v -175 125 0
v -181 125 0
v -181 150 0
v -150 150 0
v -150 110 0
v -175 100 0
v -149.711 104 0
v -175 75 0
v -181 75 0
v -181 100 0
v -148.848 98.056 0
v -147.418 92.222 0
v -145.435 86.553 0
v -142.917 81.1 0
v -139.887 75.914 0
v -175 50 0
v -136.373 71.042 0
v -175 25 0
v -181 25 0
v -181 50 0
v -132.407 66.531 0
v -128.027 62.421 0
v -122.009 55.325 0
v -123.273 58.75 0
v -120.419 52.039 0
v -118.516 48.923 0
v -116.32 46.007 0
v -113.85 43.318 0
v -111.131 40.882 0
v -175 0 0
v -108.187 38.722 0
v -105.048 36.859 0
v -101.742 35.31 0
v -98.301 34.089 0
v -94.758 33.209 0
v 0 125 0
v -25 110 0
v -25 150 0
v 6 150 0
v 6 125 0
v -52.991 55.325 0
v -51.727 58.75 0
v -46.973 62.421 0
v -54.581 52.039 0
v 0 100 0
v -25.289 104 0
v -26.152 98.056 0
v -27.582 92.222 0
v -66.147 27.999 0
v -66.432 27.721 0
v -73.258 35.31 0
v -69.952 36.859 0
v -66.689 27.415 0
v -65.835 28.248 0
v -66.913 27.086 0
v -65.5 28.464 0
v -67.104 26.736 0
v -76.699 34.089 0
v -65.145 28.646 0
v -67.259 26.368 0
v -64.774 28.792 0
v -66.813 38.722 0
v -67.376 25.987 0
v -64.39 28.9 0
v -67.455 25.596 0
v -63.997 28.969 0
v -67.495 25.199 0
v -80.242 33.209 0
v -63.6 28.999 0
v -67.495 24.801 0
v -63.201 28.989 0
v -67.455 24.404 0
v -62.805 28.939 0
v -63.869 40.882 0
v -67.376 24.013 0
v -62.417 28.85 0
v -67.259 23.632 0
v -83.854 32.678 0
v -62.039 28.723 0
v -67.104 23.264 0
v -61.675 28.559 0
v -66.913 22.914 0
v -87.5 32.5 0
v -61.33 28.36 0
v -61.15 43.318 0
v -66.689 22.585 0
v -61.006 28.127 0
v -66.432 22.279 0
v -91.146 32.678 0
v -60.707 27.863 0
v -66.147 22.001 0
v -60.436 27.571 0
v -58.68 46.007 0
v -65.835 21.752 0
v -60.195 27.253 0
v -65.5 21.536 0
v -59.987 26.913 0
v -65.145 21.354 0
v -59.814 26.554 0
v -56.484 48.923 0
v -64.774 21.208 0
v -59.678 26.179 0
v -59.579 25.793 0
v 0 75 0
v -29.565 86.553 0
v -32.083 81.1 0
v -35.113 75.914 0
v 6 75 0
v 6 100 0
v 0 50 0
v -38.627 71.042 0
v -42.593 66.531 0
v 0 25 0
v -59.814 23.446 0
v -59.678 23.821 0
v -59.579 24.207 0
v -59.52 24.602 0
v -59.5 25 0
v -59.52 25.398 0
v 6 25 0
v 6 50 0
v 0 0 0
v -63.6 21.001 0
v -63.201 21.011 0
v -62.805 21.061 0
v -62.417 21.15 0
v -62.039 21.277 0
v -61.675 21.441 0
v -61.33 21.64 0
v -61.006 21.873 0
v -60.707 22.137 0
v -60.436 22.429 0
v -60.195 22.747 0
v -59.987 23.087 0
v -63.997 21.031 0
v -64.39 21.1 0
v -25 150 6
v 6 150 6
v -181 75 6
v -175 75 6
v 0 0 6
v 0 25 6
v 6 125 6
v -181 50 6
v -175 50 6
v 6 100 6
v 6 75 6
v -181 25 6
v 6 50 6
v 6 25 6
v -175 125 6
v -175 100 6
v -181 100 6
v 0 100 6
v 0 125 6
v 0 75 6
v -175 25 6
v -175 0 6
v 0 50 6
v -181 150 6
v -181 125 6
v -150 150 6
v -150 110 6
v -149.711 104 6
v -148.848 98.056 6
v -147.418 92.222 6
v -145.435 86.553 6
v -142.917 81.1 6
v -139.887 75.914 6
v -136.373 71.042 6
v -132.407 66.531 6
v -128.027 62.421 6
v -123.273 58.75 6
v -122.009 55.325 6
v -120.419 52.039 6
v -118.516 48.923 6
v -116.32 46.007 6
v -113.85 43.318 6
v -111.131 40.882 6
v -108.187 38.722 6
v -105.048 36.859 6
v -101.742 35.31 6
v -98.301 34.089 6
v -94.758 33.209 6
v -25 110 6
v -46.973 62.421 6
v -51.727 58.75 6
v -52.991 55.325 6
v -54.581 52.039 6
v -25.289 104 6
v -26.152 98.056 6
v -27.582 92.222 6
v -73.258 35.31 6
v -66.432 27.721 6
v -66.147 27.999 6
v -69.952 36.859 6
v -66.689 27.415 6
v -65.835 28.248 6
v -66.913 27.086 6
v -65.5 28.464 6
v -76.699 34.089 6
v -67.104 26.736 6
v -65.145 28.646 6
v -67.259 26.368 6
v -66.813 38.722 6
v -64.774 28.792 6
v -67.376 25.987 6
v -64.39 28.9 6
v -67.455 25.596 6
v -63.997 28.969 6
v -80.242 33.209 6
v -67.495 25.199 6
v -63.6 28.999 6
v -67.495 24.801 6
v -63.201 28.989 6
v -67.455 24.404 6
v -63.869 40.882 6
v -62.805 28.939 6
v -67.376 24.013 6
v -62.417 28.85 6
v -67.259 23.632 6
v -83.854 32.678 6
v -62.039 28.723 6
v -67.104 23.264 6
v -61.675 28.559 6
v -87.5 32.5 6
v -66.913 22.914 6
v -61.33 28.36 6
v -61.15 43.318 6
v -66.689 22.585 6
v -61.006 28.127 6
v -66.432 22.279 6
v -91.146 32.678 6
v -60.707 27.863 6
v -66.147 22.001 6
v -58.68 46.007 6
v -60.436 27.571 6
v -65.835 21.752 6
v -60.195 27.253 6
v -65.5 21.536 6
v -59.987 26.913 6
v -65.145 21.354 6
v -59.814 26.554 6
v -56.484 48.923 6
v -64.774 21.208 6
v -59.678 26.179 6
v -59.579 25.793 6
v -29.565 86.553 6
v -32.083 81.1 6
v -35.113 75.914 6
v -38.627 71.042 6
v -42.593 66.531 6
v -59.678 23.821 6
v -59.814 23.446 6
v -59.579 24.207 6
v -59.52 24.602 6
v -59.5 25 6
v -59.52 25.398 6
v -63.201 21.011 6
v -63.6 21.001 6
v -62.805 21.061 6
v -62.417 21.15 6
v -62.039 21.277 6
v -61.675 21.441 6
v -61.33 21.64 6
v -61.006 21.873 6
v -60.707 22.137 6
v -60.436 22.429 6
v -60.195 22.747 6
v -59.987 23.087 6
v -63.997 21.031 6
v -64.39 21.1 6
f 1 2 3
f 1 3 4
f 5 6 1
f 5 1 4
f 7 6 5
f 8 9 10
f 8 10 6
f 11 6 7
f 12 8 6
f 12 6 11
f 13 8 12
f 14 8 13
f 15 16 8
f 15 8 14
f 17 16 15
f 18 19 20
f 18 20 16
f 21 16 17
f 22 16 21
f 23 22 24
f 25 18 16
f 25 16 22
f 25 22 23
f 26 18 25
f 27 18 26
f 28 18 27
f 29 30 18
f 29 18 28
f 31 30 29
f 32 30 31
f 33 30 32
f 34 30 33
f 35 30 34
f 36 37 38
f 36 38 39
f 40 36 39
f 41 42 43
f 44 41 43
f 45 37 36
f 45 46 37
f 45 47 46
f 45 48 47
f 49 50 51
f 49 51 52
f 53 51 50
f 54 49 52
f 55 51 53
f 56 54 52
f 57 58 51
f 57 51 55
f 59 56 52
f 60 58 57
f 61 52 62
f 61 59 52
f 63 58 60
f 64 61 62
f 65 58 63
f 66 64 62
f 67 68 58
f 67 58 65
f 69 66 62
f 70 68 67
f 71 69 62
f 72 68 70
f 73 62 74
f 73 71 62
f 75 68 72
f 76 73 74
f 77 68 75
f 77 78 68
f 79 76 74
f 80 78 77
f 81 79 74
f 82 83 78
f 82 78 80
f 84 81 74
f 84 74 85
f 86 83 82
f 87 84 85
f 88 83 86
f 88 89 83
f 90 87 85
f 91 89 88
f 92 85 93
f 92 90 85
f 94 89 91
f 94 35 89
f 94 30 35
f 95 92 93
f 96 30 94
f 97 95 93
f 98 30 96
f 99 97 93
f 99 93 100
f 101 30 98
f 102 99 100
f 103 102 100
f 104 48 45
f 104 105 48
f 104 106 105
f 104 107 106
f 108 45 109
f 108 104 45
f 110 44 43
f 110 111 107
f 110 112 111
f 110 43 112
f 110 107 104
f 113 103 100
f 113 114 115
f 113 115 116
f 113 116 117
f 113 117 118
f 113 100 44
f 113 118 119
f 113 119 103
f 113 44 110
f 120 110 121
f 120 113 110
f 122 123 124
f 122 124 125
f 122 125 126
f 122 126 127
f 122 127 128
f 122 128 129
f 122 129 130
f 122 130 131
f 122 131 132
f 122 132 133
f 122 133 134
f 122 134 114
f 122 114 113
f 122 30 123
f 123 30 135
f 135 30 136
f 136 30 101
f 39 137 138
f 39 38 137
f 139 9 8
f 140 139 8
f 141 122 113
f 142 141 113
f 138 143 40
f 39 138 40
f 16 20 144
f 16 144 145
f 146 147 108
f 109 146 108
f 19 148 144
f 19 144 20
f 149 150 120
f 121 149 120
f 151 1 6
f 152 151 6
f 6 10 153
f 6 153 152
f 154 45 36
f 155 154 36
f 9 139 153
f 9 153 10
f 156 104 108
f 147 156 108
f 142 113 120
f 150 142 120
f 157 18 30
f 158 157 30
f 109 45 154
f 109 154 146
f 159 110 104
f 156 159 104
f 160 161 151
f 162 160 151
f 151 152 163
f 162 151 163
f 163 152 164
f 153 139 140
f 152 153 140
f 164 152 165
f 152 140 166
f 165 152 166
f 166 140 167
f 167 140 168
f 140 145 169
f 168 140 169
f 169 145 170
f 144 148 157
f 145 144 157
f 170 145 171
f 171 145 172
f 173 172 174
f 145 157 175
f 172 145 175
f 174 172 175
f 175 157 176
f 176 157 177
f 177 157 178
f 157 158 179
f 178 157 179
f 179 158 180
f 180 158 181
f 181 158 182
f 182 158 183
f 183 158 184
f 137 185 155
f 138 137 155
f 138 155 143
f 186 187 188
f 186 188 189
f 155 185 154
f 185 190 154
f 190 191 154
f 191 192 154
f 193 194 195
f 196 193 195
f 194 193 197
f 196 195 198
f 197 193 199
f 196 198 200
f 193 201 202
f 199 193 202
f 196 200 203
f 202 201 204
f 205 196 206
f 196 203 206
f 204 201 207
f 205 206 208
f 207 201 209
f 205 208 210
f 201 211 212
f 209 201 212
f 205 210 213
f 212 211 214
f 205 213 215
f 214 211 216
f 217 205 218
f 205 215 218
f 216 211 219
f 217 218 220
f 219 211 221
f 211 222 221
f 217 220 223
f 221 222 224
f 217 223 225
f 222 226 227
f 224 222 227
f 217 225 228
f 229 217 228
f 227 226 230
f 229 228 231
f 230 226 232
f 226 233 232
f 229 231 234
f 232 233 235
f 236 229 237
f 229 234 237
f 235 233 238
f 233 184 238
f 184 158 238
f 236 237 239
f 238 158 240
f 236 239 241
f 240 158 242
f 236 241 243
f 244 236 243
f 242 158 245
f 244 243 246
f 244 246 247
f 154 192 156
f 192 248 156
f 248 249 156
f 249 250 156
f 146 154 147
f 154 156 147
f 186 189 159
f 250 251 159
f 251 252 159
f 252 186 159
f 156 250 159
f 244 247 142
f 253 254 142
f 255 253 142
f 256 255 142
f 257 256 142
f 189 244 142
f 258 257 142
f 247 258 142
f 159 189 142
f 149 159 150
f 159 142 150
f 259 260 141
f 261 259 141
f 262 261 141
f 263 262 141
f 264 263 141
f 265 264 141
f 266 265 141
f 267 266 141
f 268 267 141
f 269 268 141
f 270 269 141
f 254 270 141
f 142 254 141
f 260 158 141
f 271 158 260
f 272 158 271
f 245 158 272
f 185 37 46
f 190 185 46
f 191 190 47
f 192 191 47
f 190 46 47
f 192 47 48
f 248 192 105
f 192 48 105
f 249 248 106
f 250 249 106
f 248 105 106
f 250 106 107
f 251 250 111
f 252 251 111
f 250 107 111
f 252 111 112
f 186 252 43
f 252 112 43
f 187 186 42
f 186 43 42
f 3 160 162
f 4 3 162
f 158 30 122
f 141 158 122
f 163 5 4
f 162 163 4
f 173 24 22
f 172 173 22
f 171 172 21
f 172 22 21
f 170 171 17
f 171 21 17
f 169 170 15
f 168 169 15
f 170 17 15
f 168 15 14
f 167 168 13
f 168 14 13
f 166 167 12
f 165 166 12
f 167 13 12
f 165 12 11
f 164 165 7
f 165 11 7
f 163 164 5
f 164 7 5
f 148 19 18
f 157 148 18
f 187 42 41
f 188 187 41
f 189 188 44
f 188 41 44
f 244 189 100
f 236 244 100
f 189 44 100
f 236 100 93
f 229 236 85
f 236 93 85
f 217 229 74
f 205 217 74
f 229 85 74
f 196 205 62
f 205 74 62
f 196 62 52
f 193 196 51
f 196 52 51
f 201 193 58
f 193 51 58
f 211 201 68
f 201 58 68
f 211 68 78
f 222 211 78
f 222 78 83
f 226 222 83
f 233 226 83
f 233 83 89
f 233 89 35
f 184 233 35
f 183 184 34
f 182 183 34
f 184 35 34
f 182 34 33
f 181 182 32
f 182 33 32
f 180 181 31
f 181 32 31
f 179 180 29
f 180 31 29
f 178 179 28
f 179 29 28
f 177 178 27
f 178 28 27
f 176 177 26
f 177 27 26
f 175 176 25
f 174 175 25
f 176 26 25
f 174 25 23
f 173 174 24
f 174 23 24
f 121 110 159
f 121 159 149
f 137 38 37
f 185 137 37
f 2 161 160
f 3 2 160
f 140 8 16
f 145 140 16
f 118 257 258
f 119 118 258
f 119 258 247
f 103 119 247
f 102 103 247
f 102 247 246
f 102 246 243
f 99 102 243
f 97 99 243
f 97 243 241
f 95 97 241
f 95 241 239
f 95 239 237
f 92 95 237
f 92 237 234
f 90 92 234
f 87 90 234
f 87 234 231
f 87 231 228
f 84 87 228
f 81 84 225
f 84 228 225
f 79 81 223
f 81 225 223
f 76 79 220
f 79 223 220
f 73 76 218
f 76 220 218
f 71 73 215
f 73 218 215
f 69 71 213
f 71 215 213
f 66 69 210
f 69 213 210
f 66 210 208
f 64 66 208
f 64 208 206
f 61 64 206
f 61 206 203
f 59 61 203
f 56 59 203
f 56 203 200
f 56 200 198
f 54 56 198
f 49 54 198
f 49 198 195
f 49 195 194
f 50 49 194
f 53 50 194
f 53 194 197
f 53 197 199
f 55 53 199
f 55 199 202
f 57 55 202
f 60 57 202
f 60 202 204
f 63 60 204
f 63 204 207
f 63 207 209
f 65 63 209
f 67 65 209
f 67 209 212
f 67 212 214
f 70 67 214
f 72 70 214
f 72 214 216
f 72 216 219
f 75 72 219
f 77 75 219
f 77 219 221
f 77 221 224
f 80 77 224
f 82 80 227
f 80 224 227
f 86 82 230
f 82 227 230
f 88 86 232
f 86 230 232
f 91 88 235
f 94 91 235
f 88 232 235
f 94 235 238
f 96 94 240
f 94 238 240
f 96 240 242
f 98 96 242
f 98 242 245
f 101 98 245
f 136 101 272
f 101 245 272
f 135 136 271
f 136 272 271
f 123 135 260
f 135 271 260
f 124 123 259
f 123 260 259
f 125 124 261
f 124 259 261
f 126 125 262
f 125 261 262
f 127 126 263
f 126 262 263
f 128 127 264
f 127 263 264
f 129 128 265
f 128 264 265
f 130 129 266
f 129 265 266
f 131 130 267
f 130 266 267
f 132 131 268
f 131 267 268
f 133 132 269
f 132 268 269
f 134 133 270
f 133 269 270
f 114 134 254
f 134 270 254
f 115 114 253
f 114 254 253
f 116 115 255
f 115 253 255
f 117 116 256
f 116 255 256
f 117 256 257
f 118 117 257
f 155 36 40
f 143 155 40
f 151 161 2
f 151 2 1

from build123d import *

# Parameters (mm, degrees)
BOSS_EXTRUDE1_DEPTH   = 6
SKETCH2_W             = 6
SKETCH2_H             = 25
BOSS_EXTRUDE2_DEPTH   = 6
LPATTERN1_START       = 25
LPATTERN1_OUTLINE_W   = 6
LPATTERN1_OUTLINE_H   = 6
LPATTERN1_DEPTH       = 25
LPATTERN1_START_2     = 75
LPATTERN1_2_OUTLINE_W = 6
LPATTERN1_2_OUTLINE_H = 6
LPATTERN1_2_DEPTH     = 25
LPATTERN1_START_3     = 125
LPATTERN1_3_OUTLINE_W = 6
LPATTERN1_3_OUTLINE_H = 6
LPATTERN1_3_DEPTH     = 25
SKETCH5_R             = 4
CUT_EXTRUDE1_DEPTH    = 236.153141591


# Read off the part's stored shape, not the designer's step: LPattern1
with BuildPart() as part:
    # Sketch1 → Boss-Extrude1 (new body)
    with BuildSketch(Plane.XY):
        with BuildLine():
            Line((-150, 150), (-175, 150))
            Line((-175, 150), (-175, 0))
            Line((-175, 0), (0, 0))
            Line((0, 0), (0, 150))
            Line((0, 150), (-25, 150))
            Line((-25, 150), (-25, 110))
            ThreePointArc((-25, 110), (-32.083192968, 81.099697262), (-51.727279947, 58.75))
            ThreePointArc((-51.727279947, 58.75), (-87.5, 32.5), (-123.272720053, 58.75))
            ThreePointArc((-123.272720053, 58.75), (-142.916807032, 81.099697262), (-150, 110))
            Line((-150, 110), (-150, 150))
        make_face()
    extrude(amount=BOSS_EXTRUDE1_DEPTH)

    # Sketch2 → Boss-Extrude2 (add)
    with BuildSketch(Plane.XY.offset(6)):
        with Locations((-178, 137.5)):
            Rectangle(SKETCH2_W, SKETCH2_H)
    extrude(amount=-BOSS_EXTRUDE2_DEPTH)

    # LPattern1 outline → LPattern1 (add)
    with BuildSketch(Plane(origin=(0, 0, 0), x_dir=(1, 0, 0), z_dir=(0, 1, 0)).offset(LPATTERN1_START)):
        with Locations((-178, -3)):
            Rectangle(LPATTERN1_OUTLINE_W, LPATTERN1_OUTLINE_H)
        with Locations((3, -3)):
            Rectangle(LPATTERN1_OUTLINE_W, LPATTERN1_OUTLINE_H)
    extrude(amount=LPATTERN1_DEPTH)

    # LPattern1 2 outline → LPattern1 2 (add)
    with BuildSketch(Plane(origin=(0, 0, 0), x_dir=(1, 0, 0), z_dir=(0, 1, 0)).offset(LPATTERN1_START_2)):
        with Locations((-178, -3)):
            Rectangle(LPATTERN1_2_OUTLINE_W, LPATTERN1_2_OUTLINE_H)
        with Locations((3, -3)):
            Rectangle(LPATTERN1_2_OUTLINE_W, LPATTERN1_2_OUTLINE_H)
    extrude(amount=LPATTERN1_2_DEPTH)

    # LPattern1 3 outline → LPattern1 3 (add)
    with BuildSketch(Plane(origin=(0, 0, 0), x_dir=(1, 0, 0), z_dir=(0, 1, 0)).offset(LPATTERN1_START_3)):
        with Locations((3, -3)):
            Rectangle(LPATTERN1_3_OUTLINE_W, LPATTERN1_3_OUTLINE_H)
    extrude(amount=LPATTERN1_3_DEPTH)

    # Sketch5 → Cut-Extrude1 (cut, through all)
    with BuildSketch(Plane.XY.offset(6)):
        with Locations((-63.5, 25)):
            Circle(SKETCH5_R)
    extrude(amount=-CUT_EXTRUDE1_DEPTH, mode=Mode.SUBTRACT)


solid = part.part
